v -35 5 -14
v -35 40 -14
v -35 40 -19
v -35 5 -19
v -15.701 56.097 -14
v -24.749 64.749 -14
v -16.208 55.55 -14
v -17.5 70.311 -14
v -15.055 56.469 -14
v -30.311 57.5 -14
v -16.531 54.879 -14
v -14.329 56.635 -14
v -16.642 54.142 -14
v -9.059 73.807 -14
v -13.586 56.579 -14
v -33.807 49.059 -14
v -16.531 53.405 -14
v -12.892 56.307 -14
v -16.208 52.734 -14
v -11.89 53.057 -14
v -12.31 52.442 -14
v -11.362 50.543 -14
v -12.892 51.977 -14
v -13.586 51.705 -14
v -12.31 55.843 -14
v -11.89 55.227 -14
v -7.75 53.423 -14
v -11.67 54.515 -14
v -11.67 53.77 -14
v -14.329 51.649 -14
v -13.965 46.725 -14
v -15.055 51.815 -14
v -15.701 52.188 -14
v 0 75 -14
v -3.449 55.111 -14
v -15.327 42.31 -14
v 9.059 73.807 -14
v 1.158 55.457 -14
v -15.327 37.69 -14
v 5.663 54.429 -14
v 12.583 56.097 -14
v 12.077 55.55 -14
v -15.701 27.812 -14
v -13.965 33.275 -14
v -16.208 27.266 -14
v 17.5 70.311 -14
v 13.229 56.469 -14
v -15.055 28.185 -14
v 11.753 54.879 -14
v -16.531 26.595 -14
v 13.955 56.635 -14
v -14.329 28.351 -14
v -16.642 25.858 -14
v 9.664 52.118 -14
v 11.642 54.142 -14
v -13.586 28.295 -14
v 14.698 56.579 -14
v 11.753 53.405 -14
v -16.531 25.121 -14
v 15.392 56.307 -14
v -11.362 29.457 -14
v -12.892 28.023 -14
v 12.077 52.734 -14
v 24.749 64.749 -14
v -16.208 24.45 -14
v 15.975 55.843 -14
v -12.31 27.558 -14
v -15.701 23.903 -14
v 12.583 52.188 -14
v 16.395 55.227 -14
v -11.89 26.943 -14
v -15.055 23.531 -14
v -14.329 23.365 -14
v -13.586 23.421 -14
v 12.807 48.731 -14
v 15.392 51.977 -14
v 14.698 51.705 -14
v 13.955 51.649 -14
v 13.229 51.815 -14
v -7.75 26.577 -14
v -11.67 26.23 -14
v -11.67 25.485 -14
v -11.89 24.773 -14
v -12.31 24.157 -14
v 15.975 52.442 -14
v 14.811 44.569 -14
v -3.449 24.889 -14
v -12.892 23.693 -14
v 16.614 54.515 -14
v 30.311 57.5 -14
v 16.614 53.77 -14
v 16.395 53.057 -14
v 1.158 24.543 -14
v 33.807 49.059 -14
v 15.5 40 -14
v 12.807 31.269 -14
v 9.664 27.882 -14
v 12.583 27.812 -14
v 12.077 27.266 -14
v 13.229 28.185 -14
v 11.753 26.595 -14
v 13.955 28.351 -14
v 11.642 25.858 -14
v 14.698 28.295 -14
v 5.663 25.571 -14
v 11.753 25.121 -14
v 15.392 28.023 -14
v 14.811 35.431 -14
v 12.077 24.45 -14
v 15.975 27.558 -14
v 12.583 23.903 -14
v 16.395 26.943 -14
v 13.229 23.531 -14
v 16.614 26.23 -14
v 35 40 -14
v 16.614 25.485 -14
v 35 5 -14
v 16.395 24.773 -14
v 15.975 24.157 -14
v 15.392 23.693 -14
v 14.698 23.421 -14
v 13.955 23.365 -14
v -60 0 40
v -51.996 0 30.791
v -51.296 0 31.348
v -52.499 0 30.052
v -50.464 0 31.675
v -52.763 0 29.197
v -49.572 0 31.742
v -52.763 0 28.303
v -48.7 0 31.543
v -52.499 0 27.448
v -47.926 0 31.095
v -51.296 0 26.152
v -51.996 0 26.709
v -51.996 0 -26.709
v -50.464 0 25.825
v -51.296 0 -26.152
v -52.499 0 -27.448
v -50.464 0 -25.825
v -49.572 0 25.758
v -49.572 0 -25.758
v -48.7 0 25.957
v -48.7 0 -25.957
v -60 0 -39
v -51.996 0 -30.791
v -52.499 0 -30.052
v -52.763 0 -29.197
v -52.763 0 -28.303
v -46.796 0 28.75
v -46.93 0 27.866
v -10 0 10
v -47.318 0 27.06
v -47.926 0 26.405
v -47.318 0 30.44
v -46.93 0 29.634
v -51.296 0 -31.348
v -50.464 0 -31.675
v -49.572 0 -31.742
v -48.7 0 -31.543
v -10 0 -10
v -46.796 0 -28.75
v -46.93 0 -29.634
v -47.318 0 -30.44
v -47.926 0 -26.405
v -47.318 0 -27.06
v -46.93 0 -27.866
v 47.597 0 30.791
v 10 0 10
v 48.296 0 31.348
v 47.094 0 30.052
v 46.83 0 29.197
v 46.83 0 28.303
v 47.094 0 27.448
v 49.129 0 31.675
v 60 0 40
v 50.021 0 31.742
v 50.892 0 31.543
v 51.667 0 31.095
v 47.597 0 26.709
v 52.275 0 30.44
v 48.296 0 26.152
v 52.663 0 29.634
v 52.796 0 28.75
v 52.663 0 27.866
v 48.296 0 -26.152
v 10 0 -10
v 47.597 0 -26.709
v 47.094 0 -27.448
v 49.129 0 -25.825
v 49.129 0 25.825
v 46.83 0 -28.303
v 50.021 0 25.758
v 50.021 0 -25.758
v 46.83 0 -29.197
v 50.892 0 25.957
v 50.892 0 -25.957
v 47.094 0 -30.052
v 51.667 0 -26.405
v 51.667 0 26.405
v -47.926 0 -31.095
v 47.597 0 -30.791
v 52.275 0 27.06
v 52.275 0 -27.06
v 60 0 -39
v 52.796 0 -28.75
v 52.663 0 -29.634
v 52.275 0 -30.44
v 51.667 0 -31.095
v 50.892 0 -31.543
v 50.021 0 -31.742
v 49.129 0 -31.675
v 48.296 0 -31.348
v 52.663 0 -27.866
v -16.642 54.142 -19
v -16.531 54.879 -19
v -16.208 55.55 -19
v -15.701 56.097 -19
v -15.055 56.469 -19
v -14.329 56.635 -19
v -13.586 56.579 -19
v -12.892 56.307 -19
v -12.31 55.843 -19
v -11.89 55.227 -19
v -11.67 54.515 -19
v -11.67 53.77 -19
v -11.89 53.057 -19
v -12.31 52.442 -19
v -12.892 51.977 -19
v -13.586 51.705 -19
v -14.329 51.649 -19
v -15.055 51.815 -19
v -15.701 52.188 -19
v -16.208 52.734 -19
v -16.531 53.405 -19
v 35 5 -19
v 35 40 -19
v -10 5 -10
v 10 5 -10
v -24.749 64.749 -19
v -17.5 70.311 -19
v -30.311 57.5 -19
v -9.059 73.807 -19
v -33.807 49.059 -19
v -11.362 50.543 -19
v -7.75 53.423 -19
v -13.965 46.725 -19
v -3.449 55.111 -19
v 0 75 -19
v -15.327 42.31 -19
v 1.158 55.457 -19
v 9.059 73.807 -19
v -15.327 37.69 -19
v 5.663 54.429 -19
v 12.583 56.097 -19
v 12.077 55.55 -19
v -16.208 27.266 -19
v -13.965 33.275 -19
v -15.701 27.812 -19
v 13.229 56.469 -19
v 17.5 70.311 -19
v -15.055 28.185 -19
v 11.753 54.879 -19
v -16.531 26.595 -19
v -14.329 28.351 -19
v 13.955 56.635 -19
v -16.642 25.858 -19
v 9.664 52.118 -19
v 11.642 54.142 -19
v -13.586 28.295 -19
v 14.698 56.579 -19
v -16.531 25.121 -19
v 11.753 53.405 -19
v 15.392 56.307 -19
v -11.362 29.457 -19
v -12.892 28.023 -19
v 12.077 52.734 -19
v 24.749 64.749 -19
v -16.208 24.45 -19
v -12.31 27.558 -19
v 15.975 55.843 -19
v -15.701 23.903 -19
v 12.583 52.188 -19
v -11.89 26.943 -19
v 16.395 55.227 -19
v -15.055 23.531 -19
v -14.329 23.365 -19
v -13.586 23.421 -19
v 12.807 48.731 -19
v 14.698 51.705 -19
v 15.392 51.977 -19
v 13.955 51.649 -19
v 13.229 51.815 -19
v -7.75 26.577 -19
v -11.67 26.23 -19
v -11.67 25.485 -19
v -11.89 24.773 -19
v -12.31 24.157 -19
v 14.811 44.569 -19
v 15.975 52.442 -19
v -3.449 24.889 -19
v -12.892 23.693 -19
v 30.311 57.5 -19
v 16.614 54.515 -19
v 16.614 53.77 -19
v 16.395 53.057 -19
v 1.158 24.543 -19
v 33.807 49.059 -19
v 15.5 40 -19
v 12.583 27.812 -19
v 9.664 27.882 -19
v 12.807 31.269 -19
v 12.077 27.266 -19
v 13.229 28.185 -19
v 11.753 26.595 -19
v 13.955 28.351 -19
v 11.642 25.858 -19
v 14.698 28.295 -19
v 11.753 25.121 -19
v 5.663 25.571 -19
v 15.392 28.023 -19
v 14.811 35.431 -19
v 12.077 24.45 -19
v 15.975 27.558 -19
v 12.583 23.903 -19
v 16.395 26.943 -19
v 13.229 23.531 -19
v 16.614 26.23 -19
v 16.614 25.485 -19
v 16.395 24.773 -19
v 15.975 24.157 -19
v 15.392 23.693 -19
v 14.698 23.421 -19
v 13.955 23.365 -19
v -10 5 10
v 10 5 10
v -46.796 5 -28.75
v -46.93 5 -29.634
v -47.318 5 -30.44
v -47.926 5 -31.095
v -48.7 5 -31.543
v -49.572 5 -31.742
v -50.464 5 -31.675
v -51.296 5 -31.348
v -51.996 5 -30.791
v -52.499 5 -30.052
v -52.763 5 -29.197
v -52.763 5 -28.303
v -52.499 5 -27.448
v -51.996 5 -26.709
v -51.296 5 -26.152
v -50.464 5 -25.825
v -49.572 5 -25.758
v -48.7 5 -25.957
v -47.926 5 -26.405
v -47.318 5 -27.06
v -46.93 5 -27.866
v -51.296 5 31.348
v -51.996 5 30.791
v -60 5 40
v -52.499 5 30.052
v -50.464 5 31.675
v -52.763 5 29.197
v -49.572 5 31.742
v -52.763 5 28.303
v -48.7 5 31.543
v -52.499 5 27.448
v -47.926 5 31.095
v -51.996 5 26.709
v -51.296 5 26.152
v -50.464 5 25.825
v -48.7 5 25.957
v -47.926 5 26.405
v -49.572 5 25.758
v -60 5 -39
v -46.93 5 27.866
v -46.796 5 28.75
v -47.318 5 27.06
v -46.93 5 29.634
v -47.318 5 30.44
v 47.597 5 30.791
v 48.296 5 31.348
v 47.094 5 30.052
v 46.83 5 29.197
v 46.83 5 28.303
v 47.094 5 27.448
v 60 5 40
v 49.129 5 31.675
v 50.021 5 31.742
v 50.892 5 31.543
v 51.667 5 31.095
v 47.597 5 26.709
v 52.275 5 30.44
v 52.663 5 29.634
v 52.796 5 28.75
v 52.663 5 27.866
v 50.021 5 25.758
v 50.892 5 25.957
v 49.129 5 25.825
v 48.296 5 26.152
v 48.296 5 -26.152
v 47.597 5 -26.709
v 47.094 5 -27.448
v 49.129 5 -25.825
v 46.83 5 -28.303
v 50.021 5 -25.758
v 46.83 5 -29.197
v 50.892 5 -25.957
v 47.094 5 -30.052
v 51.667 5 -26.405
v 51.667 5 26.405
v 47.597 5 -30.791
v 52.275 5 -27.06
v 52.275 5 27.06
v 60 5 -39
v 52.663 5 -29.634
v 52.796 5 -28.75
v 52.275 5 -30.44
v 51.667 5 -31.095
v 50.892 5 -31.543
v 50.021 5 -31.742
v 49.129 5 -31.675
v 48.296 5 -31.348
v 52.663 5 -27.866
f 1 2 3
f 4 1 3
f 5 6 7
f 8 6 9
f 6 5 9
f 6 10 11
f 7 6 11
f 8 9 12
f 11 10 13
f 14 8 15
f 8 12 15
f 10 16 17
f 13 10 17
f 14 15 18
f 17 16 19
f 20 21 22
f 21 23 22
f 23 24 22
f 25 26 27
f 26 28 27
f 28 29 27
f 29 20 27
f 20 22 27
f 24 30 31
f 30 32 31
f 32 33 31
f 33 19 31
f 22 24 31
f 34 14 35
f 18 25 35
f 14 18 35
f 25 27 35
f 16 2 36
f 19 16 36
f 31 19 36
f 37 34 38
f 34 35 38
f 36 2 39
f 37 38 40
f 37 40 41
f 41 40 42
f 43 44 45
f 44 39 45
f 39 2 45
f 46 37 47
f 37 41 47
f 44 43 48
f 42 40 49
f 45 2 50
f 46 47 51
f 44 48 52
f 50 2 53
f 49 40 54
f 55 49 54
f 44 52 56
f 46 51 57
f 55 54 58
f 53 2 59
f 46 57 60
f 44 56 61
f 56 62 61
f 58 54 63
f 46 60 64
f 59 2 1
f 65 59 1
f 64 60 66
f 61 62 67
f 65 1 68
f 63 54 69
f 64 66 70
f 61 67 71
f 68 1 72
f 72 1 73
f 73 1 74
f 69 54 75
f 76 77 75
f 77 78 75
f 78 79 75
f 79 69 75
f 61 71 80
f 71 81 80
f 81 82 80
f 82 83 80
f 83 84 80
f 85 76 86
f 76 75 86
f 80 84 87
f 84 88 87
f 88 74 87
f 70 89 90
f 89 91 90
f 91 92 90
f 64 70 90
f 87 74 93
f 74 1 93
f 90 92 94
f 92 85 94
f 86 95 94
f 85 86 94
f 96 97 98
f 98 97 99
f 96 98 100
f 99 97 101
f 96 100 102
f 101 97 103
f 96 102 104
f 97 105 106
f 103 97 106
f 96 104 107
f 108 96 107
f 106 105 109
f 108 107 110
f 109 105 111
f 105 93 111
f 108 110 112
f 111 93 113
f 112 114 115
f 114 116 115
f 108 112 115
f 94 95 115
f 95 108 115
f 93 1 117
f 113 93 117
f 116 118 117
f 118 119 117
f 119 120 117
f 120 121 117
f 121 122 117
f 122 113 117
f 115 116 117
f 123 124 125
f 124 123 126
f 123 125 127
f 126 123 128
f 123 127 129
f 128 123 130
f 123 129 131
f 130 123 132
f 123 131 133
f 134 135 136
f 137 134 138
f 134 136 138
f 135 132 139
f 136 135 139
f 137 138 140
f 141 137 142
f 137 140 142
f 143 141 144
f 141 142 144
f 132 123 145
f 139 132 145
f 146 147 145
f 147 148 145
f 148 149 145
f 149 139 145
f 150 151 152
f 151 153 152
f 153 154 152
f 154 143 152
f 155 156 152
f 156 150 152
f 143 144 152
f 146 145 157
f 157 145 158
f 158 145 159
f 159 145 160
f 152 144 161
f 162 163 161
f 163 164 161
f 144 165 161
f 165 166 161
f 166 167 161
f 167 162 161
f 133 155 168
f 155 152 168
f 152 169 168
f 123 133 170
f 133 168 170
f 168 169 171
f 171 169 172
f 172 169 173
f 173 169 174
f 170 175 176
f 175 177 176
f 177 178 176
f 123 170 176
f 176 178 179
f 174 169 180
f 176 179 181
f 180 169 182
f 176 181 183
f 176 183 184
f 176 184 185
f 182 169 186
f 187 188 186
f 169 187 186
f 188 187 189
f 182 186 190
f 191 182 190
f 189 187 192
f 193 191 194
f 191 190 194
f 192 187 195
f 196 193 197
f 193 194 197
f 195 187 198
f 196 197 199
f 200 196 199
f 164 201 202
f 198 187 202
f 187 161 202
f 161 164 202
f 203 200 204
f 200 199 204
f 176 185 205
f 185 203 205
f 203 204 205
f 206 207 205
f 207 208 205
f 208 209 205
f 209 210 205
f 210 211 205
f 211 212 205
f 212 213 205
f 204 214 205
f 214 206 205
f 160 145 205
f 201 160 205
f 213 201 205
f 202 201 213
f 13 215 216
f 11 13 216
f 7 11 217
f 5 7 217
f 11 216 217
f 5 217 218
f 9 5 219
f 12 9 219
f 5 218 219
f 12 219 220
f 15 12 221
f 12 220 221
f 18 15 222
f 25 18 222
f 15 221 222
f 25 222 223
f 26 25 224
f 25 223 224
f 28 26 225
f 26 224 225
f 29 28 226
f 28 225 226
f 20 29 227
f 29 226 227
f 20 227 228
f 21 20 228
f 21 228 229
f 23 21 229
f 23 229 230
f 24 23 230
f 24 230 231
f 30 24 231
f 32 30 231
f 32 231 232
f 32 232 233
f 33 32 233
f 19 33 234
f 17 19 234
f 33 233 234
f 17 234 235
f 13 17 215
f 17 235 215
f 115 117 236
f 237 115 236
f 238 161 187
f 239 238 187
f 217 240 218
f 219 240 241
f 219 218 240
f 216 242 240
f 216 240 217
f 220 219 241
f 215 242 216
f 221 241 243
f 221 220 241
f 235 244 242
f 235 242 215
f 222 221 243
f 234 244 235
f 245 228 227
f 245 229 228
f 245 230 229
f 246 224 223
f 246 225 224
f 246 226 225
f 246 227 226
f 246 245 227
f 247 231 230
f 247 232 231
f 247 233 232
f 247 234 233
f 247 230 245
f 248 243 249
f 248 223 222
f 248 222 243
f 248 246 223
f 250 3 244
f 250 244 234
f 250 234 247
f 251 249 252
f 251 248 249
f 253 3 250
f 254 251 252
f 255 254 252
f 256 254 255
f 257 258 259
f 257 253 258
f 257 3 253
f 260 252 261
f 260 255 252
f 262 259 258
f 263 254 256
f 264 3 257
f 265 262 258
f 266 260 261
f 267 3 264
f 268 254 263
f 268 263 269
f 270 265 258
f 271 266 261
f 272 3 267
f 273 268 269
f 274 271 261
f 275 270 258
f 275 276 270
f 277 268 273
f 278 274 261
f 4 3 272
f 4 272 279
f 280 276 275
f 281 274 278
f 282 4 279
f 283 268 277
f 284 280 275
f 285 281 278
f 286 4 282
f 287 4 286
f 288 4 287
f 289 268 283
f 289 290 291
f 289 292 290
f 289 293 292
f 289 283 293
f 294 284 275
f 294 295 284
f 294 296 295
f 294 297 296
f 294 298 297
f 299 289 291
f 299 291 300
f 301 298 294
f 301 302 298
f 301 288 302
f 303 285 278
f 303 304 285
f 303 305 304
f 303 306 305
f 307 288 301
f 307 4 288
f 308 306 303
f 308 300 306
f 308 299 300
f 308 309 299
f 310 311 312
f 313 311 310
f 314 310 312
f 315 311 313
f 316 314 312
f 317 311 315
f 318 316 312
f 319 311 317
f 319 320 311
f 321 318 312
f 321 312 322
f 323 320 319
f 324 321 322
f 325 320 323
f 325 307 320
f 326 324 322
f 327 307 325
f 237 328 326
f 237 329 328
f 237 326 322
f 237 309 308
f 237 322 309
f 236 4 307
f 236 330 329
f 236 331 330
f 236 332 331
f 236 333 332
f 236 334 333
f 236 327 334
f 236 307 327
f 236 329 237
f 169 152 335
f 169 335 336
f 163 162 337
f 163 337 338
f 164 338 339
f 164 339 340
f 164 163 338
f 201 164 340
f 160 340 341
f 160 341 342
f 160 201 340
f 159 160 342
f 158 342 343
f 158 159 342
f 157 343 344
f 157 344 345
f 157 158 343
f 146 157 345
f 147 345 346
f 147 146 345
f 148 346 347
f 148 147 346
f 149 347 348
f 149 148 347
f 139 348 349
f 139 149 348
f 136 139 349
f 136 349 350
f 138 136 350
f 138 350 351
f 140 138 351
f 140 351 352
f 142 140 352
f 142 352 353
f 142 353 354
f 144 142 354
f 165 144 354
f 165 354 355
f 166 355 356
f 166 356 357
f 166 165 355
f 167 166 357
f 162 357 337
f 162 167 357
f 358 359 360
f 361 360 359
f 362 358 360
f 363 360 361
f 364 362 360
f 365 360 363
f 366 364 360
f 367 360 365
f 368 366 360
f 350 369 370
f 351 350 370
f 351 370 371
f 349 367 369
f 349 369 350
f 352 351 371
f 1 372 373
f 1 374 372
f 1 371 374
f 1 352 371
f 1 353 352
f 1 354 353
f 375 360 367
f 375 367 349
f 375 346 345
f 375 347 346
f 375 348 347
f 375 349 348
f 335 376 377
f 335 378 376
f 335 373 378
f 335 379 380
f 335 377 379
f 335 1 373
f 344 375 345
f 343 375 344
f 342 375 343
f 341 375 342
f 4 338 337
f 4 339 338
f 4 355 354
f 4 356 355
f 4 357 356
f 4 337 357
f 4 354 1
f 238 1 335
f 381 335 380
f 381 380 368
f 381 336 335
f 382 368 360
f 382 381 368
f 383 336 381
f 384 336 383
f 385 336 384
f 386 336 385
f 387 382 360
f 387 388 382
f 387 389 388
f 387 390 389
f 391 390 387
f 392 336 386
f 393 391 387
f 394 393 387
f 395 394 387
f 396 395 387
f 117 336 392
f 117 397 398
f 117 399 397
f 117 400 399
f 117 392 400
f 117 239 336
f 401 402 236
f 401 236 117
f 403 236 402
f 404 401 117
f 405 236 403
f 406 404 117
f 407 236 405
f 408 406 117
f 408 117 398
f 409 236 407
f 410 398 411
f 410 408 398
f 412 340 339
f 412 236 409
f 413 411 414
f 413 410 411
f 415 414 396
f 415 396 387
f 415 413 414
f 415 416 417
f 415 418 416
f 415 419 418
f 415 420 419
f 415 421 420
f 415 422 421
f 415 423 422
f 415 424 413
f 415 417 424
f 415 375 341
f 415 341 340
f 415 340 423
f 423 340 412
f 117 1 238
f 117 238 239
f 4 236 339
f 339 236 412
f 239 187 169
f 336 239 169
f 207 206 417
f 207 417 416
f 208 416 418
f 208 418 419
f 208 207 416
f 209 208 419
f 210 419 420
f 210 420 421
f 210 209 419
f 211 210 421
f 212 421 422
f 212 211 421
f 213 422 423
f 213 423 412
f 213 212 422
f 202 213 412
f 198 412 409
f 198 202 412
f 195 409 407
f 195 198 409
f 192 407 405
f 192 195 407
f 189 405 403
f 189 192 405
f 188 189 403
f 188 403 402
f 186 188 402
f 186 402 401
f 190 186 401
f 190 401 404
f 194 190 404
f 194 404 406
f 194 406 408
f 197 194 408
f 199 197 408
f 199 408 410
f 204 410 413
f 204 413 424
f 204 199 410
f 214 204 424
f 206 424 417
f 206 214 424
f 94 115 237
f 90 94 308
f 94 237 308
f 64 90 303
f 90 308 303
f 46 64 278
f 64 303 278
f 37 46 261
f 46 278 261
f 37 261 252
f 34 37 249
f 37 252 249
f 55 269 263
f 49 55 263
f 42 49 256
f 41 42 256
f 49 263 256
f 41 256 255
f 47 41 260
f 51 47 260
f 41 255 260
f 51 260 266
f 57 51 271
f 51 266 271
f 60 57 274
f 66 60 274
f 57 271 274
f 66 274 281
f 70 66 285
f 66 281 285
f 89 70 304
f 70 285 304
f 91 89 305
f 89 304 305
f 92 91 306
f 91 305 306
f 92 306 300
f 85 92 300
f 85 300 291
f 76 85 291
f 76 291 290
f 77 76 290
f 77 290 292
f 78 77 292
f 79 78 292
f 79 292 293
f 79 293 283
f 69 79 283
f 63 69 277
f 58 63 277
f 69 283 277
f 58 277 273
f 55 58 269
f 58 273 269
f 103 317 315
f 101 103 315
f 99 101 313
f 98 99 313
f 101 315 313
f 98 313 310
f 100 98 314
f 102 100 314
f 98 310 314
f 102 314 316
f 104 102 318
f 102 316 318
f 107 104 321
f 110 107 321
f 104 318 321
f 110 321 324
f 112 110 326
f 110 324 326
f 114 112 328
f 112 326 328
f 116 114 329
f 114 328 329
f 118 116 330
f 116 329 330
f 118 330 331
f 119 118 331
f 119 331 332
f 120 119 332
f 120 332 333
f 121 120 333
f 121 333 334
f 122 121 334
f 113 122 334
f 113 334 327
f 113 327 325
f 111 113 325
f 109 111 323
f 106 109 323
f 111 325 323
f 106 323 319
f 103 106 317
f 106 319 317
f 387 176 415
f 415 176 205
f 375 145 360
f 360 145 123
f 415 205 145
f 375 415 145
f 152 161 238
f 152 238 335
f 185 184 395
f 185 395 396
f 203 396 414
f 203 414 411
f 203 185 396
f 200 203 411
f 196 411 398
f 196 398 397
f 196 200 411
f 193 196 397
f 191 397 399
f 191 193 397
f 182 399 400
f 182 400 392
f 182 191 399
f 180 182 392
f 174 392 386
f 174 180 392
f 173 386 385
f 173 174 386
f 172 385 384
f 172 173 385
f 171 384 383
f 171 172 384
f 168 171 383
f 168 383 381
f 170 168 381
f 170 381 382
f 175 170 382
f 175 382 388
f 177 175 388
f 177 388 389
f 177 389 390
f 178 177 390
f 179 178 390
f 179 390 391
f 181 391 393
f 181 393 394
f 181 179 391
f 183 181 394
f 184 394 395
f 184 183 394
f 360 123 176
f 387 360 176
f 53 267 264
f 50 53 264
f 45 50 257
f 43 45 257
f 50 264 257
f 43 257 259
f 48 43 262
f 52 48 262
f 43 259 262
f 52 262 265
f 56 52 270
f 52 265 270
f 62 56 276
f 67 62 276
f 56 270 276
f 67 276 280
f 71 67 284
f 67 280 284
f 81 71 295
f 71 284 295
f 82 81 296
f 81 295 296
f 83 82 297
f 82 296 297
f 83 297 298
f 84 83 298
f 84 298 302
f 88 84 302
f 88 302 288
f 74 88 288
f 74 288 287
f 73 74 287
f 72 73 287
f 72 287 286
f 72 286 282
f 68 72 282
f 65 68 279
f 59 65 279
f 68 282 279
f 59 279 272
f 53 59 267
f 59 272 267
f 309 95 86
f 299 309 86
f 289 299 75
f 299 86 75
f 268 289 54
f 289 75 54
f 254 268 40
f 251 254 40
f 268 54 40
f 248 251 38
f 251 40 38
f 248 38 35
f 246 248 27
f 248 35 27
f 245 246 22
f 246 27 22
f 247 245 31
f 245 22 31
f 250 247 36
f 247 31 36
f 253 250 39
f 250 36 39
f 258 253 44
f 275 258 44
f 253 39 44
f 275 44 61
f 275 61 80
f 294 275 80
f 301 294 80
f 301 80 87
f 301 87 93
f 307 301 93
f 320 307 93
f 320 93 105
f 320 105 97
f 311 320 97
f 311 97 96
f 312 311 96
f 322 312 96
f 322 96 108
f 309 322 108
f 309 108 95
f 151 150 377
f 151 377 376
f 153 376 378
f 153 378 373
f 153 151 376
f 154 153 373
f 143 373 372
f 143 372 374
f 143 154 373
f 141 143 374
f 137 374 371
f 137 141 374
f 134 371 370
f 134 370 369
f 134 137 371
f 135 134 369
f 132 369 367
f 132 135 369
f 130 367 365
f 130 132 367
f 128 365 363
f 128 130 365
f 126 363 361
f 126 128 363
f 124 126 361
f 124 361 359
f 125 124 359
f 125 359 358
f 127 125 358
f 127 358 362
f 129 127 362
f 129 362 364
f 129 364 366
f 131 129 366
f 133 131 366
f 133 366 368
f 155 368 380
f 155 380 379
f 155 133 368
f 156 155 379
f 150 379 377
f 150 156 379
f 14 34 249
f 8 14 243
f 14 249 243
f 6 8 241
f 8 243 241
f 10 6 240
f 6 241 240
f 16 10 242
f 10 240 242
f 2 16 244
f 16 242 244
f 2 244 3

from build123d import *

# Parameters (mm, degrees)
SKETCH1_R           = 3
BOSS_EXTRUDE1_DEPTH = 5
SKETCH2_W           = 70
SKETCH2_H           = 5
BOSS_EXTRUDE2_DEPTH = 70
CUT_EXTRUDE1_DEPTH  = 20
SKETCH4_R           = 15.5
CUT_EXTRUDE2_DEPTH  = 10
CUT_EXTRUDE6_REACH  = 77
SKETCH8_W           = 20
SKETCH8_H           = 20
SKETCH9_W           = 40
SKETCH9_H           = 5
CUT_EXTRUDE7_DEPTH  = 30
SKETCH10_R          = 2.5
CUT_EXTRUDE8_DEPTH  = 5


with BuildPart() as part:
    # Sketch1 → Boss-Extrude1 (new body)
    with BuildSketch(Plane(origin=(0, 0, 0), x_dir=(1, 0, 0), z_dir=(0, 1, 0))):
        Polygon((-35, -40), (-20, -40), (-20, -70), (20, -70), (20, -40), (35, -40), (60, -40), (60, 39), (-60, 39), (-60, -40), align=None)
        with Locations((49.796460718, 28.75)):
            Circle(SKETCH1_R, mode=Mode.SUBTRACT)
        with Locations((49.796460718, -28.75)):
            Circle(SKETCH1_R, mode=Mode.SUBTRACT)
        with Locations((0, -57.5)):
            Circle(SKETCH1_R, mode=Mode.SUBTRACT)
        with Locations((-49.796460718, -28.75)):
            Circle(SKETCH1_R, mode=Mode.SUBTRACT)
        with Locations((-49.796460718, 28.75)):
            Circle(SKETCH1_R, mode=Mode.SUBTRACT)
    extrude(amount=BOSS_EXTRUDE1_DEPTH)

    # Sketch2 → Boss-Extrude2 (add)
    with BuildSketch(Plane(origin=(0, 5, 0), x_dir=(1, 0, 0), z_dir=(0, 1, 0))):
        with Locations((0, 16.5)):
            Rectangle(SKETCH2_W, SKETCH2_H)
    extrude(amount=BOSS_EXTRUDE2_DEPTH)

    # Sketch3 → Cut-Extrude1 (cut)
    with BuildSketch(Plane(origin=(0, 0, -19), x_dir=(-1, 0, 0), z_dir=(0, 0, -1))):
        with BuildLine():
            ThreePointArc((-35, 40.000002437), (-24.74873648, 64.748738203), (0, 75))
            Line((0, 75), (-35, 75))
            Line((-35, 75), (-35, 40.000002437))
        make_face()
        with BuildLine():
            Line((35, 40.000002339), (35, 75))
            Line((35, 75), (0, 75))
            ThreePointArc((0, 75), (24.748736514, 64.748738169), (35, 40.000002339))
        make_face()
    extrude(amount=-CUT_EXTRUDE1_DEPTH, mode=Mode.SUBTRACT)

    # Sketch4 → Cut-Extrude2 (cut)
    with BuildSketch(Plane.XY.offset(-14)):
        with Locations((0, 40)):
            Circle(SKETCH4_R)
    extrude(amount=-CUT_EXTRUDE2_DEPTH, mode=Mode.SUBTRACT)

    # Sketch8 → Cut-Extrude6 (cut, up to next)
    with BuildSketch(Plane.XZ, mode=Mode.PRIVATE) as cut_extrude6_sk1:
        Rectangle(SKETCH8_W, SKETCH8_H)
    cut_extrude6_tool1 = extrude(cut_extrude6_sk1.sketch, amount=-CUT_EXTRUDE6_REACH, mode=Mode.PRIVATE) & part.part
    add(cut_extrude6_tool1.solids().sort_by_distance((0, 0, 0))[0], mode=Mode.SUBTRACT)

    # Sketch9 → Cut-Extrude7 (cut)
    with BuildSketch(Plane.XY.offset(70)):
        with Locations((0, 2.5)):
            Rectangle(SKETCH9_W, SKETCH9_H)
    extrude(amount=-CUT_EXTRUDE7_DEPTH, mode=Mode.SUBTRACT)

    # Sketch10 → Cut-Extrude8 (cut)
    with BuildSketch(Plane(origin=(0, 0, -19), x_dir=(-1, 0, 0), z_dir=(0, 0, -1))):
        with Locations((14.142135624, 54.142135624)):
            Circle(SKETCH10_R)
        with Locations((14.142135624, 25.857864376)):
            Circle(SKETCH10_R)
        with Locations((-14.142135624, 25.857864376)):
            Circle(SKETCH10_R)
        with Locations((-14.142135624, 54.142135624)):
            Circle(SKETCH10_R)
    extrude(amount=-CUT_EXTRUDE8_DEPTH, mode=Mode.SUBTRACT)


solid = part.part
